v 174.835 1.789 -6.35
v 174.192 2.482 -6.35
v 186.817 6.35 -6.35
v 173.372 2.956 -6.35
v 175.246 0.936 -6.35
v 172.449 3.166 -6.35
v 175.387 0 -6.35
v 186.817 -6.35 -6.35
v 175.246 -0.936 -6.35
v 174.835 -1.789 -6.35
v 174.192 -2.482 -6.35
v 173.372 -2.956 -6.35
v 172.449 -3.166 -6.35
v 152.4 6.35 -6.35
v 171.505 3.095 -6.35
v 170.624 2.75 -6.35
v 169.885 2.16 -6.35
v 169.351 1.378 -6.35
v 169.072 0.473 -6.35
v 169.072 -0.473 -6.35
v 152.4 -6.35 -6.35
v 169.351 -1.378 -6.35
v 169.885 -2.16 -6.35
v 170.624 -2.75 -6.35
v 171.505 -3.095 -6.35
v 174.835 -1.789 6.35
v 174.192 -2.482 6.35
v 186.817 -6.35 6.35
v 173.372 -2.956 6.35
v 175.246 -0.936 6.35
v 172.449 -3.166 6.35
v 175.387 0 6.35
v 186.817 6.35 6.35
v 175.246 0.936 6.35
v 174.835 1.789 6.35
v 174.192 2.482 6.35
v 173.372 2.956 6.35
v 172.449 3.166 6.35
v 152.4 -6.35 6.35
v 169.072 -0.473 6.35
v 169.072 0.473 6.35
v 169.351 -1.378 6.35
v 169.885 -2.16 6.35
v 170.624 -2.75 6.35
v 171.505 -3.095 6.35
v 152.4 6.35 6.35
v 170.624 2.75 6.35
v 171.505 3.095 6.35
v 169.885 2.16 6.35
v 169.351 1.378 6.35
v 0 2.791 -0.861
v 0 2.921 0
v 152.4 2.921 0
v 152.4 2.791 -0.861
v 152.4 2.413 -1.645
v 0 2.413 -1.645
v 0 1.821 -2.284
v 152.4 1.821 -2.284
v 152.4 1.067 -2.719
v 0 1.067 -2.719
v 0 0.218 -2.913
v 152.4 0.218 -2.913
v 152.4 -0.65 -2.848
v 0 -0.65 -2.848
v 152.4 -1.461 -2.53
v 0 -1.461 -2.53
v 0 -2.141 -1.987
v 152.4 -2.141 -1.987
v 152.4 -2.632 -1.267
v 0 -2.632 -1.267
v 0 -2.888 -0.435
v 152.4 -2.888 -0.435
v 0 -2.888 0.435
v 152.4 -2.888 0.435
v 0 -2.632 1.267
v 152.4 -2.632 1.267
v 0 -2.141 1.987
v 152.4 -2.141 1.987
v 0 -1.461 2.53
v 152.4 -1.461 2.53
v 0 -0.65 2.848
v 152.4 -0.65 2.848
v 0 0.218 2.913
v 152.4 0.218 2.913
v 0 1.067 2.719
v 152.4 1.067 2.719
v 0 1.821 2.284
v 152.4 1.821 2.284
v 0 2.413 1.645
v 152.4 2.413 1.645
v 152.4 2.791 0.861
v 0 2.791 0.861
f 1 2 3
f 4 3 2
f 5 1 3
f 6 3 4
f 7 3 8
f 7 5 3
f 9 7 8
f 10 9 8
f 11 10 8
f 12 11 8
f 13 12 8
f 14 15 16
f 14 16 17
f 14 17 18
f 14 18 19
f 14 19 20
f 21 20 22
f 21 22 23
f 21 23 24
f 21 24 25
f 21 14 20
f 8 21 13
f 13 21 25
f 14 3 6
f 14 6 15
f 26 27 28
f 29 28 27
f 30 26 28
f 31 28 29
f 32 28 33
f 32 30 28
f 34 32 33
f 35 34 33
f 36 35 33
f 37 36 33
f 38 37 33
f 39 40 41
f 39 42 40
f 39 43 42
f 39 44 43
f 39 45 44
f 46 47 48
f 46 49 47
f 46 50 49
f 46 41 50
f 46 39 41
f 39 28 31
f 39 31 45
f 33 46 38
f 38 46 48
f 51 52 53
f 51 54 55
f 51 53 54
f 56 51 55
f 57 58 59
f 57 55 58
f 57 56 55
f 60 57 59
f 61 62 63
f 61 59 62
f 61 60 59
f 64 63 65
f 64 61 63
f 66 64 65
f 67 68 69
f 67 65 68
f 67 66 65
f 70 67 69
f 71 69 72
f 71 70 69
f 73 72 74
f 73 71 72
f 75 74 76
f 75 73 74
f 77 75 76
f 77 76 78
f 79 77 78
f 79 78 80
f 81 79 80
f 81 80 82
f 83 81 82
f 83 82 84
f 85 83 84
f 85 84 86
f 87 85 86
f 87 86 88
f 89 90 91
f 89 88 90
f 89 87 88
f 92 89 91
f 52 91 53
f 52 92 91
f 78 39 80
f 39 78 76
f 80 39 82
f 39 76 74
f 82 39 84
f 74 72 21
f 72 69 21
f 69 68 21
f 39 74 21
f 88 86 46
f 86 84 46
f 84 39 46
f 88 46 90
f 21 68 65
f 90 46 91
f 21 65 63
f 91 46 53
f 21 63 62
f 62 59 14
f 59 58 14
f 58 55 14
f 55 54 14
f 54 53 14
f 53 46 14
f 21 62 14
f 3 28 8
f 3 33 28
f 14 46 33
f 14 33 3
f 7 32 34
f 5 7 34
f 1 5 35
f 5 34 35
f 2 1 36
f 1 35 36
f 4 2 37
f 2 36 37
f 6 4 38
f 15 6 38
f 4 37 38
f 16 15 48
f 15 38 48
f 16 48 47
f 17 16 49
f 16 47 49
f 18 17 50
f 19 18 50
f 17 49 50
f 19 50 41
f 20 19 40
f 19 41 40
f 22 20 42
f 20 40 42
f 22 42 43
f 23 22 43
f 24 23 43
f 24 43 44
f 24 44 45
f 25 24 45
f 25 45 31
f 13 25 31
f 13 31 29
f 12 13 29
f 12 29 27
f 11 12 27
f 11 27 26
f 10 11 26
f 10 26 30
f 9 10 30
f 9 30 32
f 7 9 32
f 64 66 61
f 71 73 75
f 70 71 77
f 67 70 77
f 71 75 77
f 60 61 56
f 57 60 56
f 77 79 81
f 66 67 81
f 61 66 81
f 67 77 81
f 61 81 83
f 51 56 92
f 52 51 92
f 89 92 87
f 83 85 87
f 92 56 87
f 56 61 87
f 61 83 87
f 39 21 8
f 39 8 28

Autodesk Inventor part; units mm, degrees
ref_plane "YZ Plane" through (0, 0, 0) normal (1, 0, 0) x (0, 1, 0)
ref_plane "XZ Plane" through (0, 0, 0) normal (0, 1, 0) x (-1, 0, 0)
ref_plane "XY Plane" through (0, 0, 0) normal (0, 0, 1) x (1, 0, 0)
sketch "Sketch1" plane through (0, 0, 0) normal (1, 0, 0) x (0, 1, 0)
  circle A0 centre (0, 0) radius 2.921
  dimension "d0" = 5.842
extrude "Extrusion1" add sketch "Sketch1" along normal blind 152.4
sketch "Sketch2" plane through (152.4, 0, 0) normal (1, 0, 0) x (0, 0, -1)
  line L0 (-6.35, 6.35) -> (6.35, 6.35)
  line L1 (6.35, 6.35) -> (6.35, -6.35)
  line L2 (6.35, -6.35) -> (-6.35, -6.35)
  line L3 (-6.35, -6.35) -> (-6.35, 6.35)
  point P0 (0, 0)
  dimension "d5" = 12.7
  dimension "d6" = 12.7
  dimension "d7" = 6.35
  dimension "d8" = 6.35
extrude "Extrusion2" add sketch "Sketch2" along normal blind 34.417
sketch "Sketch3" plane through (152.4, -6.35, 6.35) normal (0, 0, 1) x (1, 0, 0)
  circle A0 centre (19.812, 6.35) radius 3.175
  line L0 (34.417, 12.7) -> (34.417, 0) projected
  point P0 (-152.4, 6.35)
  dimension "d12" = 0
  dimension "d9" = 6.35
  dimension "d10" = 14.605
extrude "Extrusion3" cut sketch "Sketch3" against normal blind 34.417
properties part number "SolenoidArm"
